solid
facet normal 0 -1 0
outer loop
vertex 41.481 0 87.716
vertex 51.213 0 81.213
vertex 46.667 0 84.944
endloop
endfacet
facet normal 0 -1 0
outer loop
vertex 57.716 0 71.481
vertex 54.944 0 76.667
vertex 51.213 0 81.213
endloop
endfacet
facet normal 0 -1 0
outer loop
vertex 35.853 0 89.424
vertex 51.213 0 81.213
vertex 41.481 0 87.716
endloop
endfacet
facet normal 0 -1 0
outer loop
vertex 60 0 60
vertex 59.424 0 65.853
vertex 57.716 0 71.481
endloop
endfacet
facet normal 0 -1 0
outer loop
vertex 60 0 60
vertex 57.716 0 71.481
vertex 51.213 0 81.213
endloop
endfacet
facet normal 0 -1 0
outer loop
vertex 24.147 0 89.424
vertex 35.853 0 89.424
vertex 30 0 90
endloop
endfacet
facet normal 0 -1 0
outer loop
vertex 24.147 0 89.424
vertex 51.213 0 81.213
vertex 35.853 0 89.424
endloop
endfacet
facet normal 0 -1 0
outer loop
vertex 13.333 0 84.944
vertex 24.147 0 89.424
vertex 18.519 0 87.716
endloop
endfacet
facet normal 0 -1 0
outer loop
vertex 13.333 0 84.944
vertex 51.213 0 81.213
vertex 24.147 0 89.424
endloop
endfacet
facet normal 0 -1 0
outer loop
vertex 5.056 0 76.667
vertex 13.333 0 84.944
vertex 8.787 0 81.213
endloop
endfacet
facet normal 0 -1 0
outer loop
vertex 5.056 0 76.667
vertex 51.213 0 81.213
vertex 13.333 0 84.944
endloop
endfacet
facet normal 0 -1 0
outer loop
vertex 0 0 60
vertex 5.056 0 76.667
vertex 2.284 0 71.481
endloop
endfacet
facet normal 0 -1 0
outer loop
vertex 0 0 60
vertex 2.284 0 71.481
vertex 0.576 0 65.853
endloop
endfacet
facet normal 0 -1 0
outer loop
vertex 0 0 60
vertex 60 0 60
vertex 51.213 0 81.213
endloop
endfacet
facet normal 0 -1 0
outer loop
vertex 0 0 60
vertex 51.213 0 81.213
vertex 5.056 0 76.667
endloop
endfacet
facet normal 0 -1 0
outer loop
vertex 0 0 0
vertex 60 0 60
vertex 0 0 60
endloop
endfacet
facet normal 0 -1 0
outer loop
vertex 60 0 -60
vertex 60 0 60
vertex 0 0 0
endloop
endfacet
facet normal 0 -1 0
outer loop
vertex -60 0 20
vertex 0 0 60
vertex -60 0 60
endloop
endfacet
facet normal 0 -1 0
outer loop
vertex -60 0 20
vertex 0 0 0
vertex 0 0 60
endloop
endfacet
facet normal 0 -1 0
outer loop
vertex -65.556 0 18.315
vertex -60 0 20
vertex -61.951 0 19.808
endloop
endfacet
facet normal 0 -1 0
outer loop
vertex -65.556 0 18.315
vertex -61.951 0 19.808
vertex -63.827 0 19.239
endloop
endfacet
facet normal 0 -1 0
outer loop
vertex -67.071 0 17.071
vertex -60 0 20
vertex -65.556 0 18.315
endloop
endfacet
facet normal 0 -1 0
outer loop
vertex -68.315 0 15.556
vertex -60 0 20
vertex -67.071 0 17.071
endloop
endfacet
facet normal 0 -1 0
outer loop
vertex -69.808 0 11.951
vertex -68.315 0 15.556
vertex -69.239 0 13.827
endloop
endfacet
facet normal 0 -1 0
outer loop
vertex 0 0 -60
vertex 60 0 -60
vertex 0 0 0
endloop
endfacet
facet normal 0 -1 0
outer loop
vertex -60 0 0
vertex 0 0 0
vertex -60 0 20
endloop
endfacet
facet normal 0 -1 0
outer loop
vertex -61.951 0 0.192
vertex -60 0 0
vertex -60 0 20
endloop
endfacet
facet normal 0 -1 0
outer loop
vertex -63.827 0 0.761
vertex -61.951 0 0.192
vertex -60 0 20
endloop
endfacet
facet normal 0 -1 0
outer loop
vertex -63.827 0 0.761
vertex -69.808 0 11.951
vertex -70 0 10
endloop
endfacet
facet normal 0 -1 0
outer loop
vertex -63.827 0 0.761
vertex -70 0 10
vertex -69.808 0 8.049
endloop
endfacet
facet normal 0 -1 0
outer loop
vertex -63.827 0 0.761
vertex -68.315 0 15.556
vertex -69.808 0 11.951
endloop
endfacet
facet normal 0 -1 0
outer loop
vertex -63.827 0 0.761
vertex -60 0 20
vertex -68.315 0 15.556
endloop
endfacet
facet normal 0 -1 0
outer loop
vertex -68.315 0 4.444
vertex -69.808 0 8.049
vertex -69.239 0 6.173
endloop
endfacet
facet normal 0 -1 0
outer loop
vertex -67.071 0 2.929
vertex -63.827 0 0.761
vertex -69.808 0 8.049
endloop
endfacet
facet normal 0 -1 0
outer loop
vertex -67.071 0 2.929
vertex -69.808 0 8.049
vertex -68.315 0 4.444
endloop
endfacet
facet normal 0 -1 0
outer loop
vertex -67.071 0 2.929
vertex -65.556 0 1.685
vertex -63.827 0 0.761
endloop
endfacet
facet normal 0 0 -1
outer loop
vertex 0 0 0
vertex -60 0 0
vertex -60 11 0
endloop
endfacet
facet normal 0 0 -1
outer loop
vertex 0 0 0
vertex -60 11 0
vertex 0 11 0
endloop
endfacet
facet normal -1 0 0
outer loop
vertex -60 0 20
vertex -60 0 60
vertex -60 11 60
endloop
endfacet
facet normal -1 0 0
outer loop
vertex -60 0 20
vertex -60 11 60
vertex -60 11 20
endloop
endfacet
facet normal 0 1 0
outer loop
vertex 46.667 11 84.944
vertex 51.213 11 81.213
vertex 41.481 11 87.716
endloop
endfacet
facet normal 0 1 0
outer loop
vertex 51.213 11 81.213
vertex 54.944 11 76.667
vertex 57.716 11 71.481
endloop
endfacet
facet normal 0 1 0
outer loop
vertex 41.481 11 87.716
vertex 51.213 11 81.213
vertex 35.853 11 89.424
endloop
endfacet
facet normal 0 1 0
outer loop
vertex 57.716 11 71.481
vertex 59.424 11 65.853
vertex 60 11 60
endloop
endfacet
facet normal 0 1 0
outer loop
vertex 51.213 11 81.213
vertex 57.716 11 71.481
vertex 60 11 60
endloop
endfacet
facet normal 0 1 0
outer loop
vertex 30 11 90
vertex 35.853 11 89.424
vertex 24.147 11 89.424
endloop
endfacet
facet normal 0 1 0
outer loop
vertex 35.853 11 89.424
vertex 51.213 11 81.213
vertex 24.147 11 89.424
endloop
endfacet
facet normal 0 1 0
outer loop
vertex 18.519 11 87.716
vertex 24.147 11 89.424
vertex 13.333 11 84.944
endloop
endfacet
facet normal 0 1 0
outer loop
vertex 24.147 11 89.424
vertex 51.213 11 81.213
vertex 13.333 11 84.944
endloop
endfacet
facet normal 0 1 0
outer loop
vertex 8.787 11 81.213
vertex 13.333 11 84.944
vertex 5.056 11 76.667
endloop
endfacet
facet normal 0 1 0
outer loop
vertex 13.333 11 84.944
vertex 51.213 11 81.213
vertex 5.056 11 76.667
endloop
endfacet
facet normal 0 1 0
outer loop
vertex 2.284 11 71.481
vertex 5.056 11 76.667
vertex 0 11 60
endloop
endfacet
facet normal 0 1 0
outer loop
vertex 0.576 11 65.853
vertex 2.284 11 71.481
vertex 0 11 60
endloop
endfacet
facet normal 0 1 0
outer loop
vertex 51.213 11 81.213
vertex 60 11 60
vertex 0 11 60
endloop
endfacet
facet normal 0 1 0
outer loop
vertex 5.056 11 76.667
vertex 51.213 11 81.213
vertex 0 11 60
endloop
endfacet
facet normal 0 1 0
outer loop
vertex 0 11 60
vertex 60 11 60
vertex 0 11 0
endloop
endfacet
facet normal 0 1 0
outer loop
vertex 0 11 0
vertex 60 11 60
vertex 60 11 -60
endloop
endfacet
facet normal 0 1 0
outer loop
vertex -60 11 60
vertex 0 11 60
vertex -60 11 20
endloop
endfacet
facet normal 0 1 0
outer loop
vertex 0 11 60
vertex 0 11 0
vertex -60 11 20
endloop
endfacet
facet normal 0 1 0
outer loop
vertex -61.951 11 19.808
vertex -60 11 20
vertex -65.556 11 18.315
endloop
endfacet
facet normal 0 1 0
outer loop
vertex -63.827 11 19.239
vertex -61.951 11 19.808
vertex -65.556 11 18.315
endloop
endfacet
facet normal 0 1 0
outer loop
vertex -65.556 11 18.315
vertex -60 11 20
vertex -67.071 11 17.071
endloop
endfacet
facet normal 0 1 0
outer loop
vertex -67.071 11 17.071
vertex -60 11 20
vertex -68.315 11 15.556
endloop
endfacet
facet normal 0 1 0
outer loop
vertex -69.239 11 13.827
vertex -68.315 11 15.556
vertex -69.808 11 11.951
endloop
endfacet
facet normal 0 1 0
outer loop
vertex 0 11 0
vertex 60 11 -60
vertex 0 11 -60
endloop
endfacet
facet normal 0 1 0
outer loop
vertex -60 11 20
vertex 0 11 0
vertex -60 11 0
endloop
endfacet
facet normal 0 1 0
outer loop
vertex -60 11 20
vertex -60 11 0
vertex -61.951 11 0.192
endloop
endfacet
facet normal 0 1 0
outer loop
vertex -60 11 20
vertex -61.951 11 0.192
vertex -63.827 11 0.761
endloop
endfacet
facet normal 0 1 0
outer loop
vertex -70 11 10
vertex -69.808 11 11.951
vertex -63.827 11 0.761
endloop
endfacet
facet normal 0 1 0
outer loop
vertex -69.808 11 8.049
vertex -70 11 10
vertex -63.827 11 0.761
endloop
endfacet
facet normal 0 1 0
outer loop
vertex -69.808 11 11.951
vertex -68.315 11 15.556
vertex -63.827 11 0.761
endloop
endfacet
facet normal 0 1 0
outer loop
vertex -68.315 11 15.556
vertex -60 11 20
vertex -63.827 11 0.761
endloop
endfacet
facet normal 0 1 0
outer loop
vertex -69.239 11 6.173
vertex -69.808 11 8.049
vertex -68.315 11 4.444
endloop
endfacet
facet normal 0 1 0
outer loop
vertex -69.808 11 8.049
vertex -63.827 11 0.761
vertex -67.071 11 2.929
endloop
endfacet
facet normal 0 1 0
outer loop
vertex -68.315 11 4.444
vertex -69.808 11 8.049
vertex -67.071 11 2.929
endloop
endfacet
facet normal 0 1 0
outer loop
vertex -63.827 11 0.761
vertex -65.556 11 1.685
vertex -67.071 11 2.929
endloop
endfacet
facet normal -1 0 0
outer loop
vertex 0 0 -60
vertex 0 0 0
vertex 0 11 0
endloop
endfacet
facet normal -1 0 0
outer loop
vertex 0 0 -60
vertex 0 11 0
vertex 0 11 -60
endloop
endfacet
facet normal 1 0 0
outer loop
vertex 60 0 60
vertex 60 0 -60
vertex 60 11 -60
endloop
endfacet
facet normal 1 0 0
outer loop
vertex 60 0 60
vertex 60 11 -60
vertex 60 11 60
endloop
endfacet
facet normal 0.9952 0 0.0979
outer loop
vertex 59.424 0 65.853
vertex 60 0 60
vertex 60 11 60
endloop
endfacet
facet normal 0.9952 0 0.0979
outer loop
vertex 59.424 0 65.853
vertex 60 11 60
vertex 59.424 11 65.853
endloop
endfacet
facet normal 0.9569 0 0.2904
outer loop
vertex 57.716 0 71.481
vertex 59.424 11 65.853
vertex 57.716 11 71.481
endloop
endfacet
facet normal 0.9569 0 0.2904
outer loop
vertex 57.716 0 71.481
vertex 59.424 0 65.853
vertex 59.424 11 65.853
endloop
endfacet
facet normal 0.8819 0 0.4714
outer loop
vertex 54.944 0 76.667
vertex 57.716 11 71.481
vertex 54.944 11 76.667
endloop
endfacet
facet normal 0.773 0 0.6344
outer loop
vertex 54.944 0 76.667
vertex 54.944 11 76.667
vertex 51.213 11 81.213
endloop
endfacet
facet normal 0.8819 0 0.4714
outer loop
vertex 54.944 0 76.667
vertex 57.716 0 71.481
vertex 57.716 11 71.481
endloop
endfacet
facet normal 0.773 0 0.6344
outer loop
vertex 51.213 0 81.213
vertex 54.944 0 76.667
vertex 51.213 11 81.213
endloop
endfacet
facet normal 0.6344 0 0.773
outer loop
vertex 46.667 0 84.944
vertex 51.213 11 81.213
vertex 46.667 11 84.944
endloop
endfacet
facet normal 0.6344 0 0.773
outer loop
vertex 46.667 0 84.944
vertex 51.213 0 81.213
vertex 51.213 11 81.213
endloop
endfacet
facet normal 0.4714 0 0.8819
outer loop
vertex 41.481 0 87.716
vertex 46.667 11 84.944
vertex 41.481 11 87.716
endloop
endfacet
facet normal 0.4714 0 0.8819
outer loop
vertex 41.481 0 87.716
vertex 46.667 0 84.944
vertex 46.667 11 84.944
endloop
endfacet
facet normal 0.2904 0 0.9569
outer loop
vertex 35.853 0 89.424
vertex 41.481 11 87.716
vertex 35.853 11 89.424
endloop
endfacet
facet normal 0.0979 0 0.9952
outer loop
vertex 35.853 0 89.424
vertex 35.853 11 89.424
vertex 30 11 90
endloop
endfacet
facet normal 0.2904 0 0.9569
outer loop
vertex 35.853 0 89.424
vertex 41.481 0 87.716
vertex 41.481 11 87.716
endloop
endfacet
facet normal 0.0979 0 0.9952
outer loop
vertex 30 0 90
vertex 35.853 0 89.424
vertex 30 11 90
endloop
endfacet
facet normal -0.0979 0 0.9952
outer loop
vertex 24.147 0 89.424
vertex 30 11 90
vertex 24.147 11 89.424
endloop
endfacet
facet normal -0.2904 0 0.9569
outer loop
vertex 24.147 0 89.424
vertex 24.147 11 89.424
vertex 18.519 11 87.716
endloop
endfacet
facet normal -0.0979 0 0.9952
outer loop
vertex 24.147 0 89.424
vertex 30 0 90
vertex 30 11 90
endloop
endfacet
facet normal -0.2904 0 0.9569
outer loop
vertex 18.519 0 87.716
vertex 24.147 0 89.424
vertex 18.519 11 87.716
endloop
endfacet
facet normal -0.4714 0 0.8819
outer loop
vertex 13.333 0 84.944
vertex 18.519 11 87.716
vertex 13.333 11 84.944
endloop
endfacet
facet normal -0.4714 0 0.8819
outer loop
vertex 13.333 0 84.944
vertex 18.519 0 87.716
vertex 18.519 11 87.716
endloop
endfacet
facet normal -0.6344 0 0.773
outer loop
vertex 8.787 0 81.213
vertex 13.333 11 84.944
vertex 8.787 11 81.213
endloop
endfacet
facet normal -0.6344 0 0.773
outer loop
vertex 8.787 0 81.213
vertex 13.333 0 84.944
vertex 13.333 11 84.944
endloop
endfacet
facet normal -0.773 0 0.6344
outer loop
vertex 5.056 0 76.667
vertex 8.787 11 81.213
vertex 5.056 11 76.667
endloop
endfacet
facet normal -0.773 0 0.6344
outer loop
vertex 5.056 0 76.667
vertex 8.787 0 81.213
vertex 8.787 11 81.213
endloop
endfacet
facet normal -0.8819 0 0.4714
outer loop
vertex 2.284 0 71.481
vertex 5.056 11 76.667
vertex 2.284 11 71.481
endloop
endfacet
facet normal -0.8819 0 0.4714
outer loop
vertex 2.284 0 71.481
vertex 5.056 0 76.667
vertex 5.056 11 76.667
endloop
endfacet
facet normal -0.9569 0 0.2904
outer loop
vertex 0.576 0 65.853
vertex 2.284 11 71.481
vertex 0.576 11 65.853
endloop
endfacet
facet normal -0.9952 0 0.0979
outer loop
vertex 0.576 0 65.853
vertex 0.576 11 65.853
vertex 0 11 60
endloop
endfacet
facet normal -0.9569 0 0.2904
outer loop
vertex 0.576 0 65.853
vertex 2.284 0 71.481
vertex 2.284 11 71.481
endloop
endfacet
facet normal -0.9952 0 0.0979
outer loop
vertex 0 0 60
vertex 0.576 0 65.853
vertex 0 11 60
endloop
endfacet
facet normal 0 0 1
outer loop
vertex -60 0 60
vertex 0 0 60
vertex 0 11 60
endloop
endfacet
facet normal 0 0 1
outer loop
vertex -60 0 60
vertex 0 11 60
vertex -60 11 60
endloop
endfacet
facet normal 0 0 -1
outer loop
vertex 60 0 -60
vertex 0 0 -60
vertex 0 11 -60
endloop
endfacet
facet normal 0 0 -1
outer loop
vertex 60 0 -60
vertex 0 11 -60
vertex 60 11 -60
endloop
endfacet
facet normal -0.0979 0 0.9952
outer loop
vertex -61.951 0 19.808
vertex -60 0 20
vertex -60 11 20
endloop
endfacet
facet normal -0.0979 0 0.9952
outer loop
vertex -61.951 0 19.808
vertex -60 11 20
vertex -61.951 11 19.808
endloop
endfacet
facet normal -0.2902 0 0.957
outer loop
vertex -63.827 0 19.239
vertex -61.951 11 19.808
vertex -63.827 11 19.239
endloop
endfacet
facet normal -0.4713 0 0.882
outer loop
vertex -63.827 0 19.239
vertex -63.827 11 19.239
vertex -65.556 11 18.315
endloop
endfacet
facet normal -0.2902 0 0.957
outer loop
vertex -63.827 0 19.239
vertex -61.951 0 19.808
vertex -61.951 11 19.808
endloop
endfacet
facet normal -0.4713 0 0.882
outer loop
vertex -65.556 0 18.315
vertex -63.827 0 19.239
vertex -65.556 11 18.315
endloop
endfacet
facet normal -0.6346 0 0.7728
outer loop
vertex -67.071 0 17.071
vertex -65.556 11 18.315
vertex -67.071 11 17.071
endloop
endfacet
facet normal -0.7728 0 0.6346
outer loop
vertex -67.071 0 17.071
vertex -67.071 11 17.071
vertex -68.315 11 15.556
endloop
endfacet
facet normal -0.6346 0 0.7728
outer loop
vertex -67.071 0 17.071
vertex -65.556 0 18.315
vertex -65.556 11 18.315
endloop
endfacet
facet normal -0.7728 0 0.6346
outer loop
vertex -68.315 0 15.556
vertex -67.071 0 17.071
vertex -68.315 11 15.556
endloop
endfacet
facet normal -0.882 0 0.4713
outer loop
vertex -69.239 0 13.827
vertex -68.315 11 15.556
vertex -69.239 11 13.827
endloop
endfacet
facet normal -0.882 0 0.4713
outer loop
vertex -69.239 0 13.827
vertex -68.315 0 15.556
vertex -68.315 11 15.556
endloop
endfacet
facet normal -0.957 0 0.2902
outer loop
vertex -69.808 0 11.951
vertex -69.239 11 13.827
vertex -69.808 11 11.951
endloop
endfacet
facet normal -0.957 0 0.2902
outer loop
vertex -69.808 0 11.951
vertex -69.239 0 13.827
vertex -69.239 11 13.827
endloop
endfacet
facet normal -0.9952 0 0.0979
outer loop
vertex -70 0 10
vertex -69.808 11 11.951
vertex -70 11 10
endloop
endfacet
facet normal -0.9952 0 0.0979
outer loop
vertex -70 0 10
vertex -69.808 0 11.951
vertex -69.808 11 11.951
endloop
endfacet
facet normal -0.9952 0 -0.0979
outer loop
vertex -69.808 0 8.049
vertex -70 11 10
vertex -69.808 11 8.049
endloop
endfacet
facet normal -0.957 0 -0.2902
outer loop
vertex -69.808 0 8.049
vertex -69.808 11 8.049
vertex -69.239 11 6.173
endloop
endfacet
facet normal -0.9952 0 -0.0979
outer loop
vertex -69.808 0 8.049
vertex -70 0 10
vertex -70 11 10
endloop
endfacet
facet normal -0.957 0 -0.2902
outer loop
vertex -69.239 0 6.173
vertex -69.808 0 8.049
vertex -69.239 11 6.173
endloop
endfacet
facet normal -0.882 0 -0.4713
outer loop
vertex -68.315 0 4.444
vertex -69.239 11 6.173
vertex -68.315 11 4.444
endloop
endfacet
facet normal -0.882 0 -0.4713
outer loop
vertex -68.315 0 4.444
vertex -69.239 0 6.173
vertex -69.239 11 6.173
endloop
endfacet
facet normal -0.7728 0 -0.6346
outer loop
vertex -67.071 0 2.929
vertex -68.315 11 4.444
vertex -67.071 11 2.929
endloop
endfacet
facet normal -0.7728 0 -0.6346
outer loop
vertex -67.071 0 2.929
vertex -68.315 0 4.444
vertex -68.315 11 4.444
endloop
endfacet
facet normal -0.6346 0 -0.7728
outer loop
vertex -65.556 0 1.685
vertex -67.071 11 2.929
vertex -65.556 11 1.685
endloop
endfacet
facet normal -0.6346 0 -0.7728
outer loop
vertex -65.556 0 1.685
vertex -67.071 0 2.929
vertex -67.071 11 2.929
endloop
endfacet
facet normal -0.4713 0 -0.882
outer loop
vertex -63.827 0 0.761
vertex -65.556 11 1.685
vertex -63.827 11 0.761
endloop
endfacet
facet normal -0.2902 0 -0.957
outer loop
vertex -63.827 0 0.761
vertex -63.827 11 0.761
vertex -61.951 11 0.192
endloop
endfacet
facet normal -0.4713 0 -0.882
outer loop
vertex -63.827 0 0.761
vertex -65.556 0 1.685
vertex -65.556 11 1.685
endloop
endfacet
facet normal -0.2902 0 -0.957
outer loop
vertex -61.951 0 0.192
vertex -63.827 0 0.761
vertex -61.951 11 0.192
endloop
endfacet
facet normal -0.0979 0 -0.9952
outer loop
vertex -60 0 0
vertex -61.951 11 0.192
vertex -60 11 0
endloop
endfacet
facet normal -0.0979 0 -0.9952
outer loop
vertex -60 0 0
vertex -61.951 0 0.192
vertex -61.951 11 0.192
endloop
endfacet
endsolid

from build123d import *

# Parameters (mm, degrees)
BOSS_EXTRUDE2_DEPTH = 11


with BuildPart() as part:
    # aula 4 → Boss-Extrude2 (new body)
    with BuildSketch(Plane(origin=(0, 0, 0), x_dir=(1, 0, 0), z_dir=(0, 1, 0))):
        with BuildLine():
            Line((0, 0), (0, 60))
            Line((0, 60), (60, 60))
            Line((60, 60), (60, -60))
            ThreePointArc((60, -60), (30, -90), (0, -60))
            Line((0, -60), (-60, -60))
            Line((-60, -60), (-60, -20))
            ThreePointArc((-60, -20), (-70, -10), (-60, 0))
            Line((-60, 0), (0, 0))
        make_face()
    extrude(amount=BOSS_EXTRUDE2_DEPTH)


solid = part.part
